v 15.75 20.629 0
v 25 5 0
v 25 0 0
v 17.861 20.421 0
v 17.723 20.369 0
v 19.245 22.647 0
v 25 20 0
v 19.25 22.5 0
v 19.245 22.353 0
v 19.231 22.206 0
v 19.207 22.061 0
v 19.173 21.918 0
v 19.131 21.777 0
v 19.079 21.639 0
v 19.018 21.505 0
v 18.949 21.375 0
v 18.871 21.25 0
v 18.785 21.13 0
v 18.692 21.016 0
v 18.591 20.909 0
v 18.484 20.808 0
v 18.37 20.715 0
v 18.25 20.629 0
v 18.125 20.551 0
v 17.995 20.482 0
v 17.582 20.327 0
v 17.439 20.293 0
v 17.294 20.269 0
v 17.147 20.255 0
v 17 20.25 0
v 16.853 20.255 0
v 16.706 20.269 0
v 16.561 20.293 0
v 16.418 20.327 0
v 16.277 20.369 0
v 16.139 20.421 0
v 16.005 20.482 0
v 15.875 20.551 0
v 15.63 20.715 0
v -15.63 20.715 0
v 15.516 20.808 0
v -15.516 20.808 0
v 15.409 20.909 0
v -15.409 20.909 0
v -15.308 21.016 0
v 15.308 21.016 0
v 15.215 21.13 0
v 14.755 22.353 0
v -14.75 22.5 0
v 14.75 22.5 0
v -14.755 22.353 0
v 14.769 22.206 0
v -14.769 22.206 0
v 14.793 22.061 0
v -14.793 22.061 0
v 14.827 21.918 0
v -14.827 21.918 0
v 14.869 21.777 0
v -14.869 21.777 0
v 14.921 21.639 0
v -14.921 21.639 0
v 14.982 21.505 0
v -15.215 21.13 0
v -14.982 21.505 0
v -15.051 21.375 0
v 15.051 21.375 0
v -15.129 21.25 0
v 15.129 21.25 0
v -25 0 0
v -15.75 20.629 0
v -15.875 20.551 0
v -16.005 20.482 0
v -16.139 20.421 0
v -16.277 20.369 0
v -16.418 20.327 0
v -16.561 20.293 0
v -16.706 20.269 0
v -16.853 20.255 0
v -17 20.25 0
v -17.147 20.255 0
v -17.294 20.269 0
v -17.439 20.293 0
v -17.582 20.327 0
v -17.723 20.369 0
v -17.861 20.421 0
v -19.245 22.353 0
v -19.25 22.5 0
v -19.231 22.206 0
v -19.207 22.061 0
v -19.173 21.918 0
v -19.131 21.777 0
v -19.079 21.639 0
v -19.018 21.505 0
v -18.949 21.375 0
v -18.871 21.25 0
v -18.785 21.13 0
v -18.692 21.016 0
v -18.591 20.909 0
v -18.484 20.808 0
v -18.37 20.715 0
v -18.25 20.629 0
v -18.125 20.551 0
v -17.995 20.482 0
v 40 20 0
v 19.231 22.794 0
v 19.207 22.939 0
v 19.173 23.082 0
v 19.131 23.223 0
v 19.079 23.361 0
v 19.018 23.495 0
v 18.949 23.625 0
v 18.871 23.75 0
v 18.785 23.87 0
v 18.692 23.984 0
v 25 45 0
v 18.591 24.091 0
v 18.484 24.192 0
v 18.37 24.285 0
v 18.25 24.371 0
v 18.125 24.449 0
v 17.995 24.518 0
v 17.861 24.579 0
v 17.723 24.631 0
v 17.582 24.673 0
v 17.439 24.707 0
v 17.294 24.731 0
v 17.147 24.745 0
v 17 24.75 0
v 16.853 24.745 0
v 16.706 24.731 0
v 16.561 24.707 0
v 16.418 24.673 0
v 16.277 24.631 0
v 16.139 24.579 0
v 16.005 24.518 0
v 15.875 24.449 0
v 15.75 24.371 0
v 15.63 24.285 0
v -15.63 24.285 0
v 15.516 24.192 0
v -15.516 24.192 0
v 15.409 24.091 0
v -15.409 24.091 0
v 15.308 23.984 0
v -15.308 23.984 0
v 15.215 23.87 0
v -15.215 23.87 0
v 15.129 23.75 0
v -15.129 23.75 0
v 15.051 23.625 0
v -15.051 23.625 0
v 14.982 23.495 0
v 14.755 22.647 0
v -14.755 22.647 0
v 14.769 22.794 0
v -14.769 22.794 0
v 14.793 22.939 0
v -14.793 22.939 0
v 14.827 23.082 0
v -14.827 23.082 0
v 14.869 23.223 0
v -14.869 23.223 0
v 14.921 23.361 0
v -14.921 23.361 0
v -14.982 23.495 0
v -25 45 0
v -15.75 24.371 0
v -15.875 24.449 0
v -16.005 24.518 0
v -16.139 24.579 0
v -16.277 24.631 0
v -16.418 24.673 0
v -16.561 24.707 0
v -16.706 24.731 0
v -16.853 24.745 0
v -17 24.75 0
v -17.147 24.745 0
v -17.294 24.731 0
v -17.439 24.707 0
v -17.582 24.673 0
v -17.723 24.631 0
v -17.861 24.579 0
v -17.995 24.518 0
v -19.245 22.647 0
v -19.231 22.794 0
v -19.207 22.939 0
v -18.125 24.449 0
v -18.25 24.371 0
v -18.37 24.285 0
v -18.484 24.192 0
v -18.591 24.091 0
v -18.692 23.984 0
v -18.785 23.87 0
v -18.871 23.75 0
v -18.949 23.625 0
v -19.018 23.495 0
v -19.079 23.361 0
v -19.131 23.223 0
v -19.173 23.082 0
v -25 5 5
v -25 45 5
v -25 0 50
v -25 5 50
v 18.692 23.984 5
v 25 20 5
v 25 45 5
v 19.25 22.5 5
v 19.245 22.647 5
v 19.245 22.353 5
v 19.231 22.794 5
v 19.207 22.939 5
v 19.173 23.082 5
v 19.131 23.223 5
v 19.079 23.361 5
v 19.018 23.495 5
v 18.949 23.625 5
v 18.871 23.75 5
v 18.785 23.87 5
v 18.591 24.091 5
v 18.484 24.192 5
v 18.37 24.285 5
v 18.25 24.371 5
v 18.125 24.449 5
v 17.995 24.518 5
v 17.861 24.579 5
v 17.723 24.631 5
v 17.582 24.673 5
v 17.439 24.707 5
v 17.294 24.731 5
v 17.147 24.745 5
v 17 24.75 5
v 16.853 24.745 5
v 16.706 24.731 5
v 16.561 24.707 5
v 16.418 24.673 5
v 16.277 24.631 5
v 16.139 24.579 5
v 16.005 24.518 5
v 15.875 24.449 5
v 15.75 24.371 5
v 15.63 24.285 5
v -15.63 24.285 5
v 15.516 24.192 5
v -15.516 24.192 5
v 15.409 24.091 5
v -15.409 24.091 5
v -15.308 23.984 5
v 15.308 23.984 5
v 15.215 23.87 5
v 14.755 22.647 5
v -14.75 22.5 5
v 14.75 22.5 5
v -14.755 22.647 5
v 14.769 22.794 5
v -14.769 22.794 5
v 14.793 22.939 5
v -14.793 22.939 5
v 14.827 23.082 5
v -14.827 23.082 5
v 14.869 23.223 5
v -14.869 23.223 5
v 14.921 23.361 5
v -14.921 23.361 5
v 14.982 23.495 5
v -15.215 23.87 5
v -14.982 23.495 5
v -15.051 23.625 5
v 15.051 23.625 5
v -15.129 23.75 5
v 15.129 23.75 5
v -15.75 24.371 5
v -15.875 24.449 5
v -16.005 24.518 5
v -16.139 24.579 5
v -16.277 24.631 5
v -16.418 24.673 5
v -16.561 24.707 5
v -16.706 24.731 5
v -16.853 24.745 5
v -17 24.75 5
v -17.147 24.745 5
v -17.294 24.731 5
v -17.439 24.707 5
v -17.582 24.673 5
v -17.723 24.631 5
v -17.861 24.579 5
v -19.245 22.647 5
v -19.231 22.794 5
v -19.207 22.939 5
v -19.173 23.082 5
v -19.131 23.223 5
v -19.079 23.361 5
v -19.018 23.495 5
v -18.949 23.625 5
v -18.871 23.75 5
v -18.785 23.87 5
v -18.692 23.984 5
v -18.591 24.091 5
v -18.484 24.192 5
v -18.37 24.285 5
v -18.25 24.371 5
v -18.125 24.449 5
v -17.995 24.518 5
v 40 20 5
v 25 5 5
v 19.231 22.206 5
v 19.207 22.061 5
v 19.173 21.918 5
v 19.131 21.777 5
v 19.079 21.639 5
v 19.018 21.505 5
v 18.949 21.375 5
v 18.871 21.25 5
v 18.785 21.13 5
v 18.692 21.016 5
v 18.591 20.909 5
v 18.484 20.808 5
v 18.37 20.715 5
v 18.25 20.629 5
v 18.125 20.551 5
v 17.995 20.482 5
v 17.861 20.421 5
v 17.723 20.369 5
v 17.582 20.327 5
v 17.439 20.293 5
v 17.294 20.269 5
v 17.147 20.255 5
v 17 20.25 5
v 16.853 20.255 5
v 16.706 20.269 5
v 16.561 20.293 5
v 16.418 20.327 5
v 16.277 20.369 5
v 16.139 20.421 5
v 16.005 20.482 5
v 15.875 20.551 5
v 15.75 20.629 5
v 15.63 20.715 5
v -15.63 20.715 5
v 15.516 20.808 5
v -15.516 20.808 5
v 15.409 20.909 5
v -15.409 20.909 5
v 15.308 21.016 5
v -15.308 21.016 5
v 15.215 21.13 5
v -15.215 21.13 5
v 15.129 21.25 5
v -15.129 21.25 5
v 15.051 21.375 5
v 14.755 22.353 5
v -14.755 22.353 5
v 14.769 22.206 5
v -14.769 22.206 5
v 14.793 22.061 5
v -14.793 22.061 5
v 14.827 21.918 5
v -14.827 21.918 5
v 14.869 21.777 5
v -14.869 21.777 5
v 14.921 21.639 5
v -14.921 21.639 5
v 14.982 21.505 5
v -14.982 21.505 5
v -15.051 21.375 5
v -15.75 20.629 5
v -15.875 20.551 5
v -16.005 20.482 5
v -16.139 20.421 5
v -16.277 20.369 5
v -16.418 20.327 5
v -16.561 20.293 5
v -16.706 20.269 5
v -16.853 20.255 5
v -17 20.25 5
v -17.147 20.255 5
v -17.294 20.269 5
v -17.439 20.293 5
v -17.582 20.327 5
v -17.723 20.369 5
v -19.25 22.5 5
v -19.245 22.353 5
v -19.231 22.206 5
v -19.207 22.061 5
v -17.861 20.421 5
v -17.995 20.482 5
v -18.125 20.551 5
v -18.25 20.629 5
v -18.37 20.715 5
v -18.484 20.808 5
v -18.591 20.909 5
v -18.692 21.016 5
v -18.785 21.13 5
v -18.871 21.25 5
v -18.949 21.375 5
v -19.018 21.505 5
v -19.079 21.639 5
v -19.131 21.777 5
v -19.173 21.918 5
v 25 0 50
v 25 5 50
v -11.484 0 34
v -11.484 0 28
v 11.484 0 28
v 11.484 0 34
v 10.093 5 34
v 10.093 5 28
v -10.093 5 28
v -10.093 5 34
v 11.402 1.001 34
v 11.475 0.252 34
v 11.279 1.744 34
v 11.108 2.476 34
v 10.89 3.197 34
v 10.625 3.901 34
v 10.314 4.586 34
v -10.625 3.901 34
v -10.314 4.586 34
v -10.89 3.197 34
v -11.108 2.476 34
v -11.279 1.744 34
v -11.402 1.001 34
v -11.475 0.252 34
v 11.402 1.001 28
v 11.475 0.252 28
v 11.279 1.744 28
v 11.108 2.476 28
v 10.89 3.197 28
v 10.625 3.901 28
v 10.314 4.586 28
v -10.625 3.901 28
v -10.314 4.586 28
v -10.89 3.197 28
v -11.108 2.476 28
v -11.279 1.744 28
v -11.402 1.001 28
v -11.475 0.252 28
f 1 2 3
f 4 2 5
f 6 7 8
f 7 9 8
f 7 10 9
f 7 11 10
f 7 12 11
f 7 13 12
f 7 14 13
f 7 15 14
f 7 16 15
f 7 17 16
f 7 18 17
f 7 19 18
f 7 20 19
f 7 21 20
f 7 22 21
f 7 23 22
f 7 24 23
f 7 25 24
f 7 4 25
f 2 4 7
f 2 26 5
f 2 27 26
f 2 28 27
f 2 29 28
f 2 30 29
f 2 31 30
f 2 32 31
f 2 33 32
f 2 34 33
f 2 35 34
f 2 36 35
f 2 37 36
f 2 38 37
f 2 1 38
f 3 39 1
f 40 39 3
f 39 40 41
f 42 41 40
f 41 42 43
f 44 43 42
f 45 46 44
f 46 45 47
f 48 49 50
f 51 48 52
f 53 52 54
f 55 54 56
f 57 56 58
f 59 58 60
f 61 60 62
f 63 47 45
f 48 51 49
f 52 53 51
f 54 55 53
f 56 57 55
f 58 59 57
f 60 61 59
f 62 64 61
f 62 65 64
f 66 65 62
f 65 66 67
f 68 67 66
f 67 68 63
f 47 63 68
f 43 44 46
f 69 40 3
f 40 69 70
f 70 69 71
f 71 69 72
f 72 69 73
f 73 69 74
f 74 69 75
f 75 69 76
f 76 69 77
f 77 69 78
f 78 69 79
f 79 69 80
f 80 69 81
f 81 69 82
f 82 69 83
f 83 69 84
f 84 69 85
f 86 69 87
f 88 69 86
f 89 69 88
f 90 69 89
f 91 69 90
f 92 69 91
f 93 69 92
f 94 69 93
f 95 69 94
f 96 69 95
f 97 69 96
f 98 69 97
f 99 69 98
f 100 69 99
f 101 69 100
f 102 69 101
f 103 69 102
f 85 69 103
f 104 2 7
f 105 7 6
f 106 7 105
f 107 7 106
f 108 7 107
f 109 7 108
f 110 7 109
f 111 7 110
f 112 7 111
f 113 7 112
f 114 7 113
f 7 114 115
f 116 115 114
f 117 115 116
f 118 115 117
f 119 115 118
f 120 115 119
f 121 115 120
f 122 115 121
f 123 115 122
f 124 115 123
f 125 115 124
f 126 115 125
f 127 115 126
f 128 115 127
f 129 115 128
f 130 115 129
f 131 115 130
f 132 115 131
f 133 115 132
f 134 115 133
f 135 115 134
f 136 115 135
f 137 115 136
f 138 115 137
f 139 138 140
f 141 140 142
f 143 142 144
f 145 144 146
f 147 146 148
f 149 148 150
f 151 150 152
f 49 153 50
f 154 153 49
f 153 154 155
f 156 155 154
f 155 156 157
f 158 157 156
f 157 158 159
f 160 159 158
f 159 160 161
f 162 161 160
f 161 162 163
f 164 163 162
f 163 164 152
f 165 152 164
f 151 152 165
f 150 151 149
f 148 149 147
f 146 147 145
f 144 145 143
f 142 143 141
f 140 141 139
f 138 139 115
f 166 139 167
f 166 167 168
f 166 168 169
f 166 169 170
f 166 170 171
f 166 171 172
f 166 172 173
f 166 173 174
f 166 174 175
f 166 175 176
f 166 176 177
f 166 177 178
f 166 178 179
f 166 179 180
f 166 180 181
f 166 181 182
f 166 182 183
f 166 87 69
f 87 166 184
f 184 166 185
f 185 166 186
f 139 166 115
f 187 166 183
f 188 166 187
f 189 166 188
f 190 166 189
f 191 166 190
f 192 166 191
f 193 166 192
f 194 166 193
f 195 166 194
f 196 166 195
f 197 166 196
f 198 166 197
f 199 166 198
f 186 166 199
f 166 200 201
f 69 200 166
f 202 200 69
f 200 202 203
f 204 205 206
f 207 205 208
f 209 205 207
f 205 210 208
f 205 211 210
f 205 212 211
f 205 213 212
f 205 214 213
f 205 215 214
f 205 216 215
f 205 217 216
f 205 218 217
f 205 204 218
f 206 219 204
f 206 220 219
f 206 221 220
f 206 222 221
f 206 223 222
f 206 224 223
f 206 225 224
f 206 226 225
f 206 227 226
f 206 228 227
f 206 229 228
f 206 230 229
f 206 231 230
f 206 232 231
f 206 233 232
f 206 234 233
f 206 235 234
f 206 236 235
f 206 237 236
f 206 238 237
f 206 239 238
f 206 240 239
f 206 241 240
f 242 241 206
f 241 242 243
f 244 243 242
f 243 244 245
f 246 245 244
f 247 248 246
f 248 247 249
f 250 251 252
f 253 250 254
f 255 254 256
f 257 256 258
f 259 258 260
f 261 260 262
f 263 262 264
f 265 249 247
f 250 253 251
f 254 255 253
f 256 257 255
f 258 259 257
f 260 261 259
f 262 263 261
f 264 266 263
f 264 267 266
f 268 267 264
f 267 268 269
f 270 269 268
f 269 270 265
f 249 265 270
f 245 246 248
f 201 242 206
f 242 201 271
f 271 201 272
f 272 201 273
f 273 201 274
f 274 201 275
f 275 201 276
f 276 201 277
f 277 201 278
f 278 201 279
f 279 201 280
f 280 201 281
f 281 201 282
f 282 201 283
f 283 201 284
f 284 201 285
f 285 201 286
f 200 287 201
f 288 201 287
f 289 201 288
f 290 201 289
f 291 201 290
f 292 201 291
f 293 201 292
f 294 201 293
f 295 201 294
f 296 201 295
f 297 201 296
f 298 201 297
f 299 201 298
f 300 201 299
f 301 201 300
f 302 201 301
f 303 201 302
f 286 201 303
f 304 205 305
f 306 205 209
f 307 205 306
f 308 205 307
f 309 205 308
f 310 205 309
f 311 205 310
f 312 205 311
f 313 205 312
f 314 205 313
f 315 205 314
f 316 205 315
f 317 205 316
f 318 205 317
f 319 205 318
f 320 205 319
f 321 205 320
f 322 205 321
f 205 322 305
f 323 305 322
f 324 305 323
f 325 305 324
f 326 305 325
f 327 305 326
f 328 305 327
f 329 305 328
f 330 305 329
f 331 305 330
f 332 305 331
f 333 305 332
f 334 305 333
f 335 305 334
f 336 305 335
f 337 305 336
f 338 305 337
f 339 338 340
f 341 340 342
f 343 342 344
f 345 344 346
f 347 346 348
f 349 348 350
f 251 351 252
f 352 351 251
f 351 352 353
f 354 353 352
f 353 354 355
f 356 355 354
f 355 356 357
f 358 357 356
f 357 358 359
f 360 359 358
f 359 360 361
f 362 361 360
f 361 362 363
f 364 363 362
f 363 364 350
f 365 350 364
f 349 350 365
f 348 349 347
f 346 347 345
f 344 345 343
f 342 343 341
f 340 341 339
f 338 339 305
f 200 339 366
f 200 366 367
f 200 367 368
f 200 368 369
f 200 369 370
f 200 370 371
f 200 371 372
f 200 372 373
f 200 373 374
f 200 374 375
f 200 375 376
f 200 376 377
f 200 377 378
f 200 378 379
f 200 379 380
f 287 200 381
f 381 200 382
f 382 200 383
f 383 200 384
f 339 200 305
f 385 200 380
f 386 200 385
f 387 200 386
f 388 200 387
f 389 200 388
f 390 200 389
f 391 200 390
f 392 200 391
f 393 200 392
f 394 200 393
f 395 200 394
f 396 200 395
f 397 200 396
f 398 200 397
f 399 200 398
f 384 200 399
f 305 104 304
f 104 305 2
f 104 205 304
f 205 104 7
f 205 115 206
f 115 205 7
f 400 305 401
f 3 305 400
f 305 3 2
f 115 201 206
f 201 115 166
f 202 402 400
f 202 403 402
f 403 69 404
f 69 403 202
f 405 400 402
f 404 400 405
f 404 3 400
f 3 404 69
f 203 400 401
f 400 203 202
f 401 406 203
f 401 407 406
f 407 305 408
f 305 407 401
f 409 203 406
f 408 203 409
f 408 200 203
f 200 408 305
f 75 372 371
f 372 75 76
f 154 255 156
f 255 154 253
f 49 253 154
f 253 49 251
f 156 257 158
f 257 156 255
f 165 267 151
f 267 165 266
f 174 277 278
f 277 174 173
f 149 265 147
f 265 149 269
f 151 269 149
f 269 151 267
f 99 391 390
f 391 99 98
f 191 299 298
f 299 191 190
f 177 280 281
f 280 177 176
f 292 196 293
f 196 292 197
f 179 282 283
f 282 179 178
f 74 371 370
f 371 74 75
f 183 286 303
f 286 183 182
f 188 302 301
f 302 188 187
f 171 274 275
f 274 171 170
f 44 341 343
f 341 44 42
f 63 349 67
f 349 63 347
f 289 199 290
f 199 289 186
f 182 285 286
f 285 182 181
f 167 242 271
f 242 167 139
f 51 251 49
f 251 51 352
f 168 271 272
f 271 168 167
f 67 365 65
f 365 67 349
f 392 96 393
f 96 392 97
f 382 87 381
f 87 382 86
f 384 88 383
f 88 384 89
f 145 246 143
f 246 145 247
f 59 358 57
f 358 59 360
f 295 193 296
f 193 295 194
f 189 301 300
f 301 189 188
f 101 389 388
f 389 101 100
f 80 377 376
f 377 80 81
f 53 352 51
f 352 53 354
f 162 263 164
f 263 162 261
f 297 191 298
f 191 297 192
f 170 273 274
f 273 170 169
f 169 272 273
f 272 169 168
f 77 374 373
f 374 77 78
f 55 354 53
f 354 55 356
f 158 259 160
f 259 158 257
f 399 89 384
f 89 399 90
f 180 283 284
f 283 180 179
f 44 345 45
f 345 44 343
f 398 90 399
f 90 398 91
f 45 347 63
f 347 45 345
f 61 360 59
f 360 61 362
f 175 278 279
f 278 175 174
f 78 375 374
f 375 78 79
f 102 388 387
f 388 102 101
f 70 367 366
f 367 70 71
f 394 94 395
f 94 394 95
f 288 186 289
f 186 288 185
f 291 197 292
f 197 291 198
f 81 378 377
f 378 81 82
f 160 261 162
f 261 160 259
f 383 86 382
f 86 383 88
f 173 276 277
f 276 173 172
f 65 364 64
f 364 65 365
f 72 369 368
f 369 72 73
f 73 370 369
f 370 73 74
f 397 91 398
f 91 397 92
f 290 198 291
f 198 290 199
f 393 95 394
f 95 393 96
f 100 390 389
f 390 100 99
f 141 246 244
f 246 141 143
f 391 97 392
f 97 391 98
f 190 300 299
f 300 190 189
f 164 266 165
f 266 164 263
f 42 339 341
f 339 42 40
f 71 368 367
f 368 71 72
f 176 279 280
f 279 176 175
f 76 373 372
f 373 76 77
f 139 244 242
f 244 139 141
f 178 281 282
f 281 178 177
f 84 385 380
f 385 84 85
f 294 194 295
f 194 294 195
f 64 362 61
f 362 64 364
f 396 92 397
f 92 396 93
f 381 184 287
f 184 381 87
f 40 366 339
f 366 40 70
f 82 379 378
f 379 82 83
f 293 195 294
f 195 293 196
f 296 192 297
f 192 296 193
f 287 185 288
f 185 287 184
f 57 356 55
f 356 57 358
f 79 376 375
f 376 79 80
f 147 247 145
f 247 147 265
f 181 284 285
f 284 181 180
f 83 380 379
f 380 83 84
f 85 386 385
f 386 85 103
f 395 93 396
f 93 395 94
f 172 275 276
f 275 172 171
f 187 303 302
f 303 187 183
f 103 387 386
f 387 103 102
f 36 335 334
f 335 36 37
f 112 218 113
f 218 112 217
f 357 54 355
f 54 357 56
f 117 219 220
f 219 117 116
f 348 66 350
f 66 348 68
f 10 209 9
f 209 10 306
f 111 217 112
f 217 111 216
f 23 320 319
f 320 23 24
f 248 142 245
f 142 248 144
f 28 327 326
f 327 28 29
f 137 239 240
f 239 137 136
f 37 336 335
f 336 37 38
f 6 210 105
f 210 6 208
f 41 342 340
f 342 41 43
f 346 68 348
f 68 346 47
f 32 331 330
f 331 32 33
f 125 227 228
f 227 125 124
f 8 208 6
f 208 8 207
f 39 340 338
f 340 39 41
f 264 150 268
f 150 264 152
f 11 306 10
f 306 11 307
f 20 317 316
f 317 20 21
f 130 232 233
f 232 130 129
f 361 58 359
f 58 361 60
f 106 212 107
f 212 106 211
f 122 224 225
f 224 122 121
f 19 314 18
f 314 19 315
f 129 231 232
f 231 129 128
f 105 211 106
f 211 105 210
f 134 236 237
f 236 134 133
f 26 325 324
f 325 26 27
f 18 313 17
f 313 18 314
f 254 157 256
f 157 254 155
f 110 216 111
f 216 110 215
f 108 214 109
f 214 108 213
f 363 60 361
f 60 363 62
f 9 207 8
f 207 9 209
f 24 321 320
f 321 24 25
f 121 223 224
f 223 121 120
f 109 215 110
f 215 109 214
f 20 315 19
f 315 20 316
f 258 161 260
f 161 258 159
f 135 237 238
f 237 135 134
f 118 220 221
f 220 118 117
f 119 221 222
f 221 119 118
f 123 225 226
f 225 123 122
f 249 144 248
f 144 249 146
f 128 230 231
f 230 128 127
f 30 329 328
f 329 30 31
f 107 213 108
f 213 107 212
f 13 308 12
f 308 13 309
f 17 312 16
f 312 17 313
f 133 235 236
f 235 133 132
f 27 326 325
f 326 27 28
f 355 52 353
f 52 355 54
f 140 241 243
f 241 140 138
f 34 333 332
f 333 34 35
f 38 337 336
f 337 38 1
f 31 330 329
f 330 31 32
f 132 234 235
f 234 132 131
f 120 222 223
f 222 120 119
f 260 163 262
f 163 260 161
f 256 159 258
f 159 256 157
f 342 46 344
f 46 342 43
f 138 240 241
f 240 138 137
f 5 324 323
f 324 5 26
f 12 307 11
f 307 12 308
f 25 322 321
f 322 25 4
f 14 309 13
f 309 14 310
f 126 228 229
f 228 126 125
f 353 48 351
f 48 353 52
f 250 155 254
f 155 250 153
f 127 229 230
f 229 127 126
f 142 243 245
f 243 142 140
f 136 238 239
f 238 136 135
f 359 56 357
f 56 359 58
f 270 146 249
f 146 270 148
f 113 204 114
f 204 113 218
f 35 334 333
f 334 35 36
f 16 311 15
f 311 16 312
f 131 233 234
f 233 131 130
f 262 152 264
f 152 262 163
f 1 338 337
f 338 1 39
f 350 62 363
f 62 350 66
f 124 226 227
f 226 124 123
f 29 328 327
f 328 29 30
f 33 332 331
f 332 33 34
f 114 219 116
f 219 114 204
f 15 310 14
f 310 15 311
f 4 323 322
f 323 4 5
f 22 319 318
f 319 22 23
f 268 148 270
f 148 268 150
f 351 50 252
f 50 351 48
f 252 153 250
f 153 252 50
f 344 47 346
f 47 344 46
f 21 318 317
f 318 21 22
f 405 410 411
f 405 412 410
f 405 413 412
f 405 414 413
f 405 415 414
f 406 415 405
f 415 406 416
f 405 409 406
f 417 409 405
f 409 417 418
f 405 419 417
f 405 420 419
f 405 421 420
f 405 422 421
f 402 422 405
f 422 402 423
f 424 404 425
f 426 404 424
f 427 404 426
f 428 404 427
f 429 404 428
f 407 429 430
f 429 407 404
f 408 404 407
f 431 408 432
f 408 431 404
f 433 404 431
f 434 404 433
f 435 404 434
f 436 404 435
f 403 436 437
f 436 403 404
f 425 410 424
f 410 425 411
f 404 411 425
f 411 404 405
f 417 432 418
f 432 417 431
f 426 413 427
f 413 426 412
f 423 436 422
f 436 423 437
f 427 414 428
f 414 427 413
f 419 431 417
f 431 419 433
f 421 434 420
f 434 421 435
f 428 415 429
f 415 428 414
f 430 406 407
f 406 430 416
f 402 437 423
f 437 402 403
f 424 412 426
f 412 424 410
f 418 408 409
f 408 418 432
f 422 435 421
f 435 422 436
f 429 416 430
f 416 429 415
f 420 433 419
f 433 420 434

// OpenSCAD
// L-shaped mounting bracket for NEMA 17 stepper motor (e.g. syringe pump)
// Print orientation: base plate on bed, vertical plate builds upward (+Z)

// ---------------- Parameters ----------------
base_x      = 25;    // base plate half-length in X (extends -base_x .. +base_x)
base_y      = 45;    // base plate length in Y
base_z      = 5;     // base plate thickness

motor_plate_x = 25;  // motor plate half-length in X (extends -motor_plate_x .. +motor_plate_x)
motor_plate_y = 5;   // motor plate thickness in Y
motor_plate_z = 50;  // motor plate height in Z

boss_hole   = 23;    // motor centring boss hole diameter
boss_x      = 0;     // boss hole centre X
boss_z      = 28;    // boss hole centre Z

screw_hole  = 3.4;   // M3 screw hole diameter
screw_n     = 4;     // number of screw holes
screw_pitch = 31;    // square pattern side length

gusset_t    = 5;     // gusset thickness in X
gusset_y    = 20;    // gusset leg along +Y
gusset_z    = 20;    // gusset leg along +Z

eps         = 0.5;   // cutter overshoot past faces

$fn = 96;

// ---------------- Model ----------------
difference() {
    union() {
        // Base plate
        translate([-base_x, 0, 0])
            cube([2*base_x, base_y, base_z]);

        // Vertical motor plate
        translate([-motor_plate_x, 0, 0])
            cube([2*motor_plate_x, motor_plate_y, motor_plate_z]);

        // Gussets, flush with left and right edges
        for (sx = [-1, 1])
            translate([sx > 0 ? motor_plate_x - gusset_t : -base_x, 0, 0])
                linear_extrude(height = gusset_t)
                    polygon([[0, 0], [0, gusset_y], [gusset_z, gusset_y]]);
    }

    // Base plate through-holes (M4)
    for (x = [-17, 17])
        translate([x, base_y/2, -eps])
            cylinder(d = 4.5, h = base_z + 2*eps);

    // Motor plate boss hole (along Y) and M3 screw pattern
    translate([boss_x, -eps, boss_z])
        cylinder(d = boss_hole, h = motor_plate_y + 2*eps);

    for (i = [0 : screw_n - 1]) {
        x = -screw_pitch/2 + (i + 0.5) * screw_pitch;
        translate([x, -eps, boss_z])
            cylinder(d = screw_hole, h = motor_plate_y + 2*eps);
    }
}
